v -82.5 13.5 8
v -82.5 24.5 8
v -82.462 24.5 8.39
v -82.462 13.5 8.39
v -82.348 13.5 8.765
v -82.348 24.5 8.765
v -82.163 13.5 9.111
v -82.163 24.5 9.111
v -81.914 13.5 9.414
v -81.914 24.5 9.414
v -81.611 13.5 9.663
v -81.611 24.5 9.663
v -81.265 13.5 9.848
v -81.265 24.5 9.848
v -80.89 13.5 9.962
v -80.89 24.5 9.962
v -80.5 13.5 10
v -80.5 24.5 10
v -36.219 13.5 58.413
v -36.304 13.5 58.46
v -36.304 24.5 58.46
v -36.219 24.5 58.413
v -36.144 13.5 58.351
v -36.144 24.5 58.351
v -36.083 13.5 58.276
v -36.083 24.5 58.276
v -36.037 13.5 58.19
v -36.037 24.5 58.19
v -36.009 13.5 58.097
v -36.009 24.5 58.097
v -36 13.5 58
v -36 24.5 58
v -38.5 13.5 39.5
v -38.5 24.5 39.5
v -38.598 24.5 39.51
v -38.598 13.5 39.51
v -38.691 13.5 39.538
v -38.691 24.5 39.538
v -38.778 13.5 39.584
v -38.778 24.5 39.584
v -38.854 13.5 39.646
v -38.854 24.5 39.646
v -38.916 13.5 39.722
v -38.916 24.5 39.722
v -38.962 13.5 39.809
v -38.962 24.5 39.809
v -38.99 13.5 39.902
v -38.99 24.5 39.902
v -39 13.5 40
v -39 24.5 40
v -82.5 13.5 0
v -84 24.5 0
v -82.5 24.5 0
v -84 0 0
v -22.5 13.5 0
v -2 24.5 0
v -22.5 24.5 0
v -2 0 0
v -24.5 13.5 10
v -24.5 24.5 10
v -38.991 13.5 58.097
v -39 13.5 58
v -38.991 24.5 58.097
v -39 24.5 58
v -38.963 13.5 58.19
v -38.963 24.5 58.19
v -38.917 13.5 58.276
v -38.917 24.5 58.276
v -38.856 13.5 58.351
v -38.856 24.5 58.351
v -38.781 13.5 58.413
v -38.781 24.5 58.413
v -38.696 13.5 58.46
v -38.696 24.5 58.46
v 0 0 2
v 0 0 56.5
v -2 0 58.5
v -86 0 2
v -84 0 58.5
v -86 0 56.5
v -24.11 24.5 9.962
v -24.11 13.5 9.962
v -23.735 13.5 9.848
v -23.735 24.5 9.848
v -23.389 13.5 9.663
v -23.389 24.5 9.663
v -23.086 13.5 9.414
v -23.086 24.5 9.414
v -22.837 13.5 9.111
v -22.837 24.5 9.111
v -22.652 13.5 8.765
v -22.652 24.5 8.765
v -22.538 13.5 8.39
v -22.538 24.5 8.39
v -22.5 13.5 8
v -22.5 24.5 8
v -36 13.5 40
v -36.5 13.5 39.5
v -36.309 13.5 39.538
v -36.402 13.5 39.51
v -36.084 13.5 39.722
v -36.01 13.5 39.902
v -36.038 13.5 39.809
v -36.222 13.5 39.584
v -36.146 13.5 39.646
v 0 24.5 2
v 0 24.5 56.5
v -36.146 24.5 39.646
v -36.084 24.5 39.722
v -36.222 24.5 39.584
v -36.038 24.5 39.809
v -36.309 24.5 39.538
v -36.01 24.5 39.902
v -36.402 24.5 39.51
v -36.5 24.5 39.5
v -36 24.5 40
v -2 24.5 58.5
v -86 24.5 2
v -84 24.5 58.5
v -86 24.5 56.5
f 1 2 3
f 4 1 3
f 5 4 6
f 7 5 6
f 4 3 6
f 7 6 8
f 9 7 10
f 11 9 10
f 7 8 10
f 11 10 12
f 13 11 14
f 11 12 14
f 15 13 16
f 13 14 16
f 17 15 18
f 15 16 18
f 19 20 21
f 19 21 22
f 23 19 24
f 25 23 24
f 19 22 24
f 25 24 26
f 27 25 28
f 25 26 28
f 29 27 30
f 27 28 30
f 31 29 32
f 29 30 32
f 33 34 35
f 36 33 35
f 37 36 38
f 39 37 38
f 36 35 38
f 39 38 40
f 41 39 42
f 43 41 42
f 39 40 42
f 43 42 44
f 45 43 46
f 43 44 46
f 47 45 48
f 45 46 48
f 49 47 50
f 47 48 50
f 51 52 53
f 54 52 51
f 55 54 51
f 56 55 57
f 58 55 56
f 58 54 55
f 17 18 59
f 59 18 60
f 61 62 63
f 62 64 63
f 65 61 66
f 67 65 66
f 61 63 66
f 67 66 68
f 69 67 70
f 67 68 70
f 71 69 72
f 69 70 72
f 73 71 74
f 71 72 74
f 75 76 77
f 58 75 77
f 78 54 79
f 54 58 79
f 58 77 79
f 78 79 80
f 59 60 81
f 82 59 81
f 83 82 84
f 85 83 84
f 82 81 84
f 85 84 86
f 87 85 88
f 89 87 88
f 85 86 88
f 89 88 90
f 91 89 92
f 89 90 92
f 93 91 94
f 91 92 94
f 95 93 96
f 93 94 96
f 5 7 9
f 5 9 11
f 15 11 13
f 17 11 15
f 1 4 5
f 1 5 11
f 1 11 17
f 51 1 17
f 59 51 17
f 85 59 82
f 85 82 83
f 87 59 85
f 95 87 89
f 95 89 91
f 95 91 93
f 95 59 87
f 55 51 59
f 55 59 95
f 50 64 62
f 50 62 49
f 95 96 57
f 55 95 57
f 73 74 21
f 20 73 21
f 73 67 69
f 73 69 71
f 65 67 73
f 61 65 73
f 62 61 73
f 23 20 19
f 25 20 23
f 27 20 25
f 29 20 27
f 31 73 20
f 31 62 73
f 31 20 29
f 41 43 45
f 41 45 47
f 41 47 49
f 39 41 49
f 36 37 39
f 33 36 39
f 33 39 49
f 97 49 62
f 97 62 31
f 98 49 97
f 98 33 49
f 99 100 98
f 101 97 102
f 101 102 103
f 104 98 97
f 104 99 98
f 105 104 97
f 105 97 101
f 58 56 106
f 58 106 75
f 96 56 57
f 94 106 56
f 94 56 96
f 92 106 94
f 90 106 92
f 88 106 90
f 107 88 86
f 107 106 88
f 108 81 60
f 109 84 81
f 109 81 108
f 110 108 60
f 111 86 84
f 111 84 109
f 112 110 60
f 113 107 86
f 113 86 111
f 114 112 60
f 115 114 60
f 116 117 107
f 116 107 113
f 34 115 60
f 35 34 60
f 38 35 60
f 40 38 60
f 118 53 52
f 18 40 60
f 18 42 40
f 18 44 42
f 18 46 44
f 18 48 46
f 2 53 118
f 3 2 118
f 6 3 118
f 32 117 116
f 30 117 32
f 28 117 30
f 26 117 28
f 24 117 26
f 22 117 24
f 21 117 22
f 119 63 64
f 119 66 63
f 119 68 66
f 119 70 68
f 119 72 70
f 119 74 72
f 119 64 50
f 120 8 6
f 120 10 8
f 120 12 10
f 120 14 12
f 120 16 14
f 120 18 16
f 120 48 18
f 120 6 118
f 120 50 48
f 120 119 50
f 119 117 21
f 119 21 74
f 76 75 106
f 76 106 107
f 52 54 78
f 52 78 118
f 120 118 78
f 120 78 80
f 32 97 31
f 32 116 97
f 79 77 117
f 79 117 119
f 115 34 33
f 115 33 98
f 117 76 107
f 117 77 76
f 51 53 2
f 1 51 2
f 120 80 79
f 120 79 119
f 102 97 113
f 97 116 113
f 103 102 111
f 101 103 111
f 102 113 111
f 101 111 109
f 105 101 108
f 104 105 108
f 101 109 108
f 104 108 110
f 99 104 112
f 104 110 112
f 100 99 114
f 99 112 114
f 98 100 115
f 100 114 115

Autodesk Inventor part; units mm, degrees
ref_plane "YZ Plane" through (0, 0, 0) normal (1, 0, 0) x (0, 1, 0)
ref_plane "XZ Plane" through (0, 0, 0) normal (0, 1, 0) x (-1, 0, 0)
ref_plane "XY Plane" through (0, 0, 0) normal (0, 0, 1) x (1, 0, 0)
sketch "Boceto1" plane through (0, 0, 0) normal (0, 1, 0) x (-1, 0, 0)
  line L0 (88, 0) -> (0, 0)
  line L1 (0, 0) -> (0, 58.5)
  line L2 (0, 58.5) -> (88, 58.5)
  line L3 (88, 58.5) -> (88, 0)
  dimension "d0" = 58.5
  dimension "d1" = 88
extrude "Extrusión1" add sketch "Boceto1" along normal blind 24.5
sketch "Boceto2" plane through (0, 24.5, 0) normal (0, 1, 0) x (1, 0, 0)
  line L0 (0, 0) -> (-88, 0) projected
  line L1 (-88, 0) -> (-88, -58.5) projected
  line L2 (-88, -58.5) -> (0, -58.5) projected
  line L3 (0, -58.5) -> (0, 0) projected
  line L4 (-36, -58.5) -> (0, -58.5)
  line L5 (-36.5, -58.5) -> (-38.5, -58.5)
  line L6 (-39, -58) -> (-39, -40)
  line L7 (-38.5, -39.5) -> (-36.5, -39.5)
  line L8 (-36, -40) -> (-36, -58)
  line L9 (0, 0) -> (-22.5, 0)
  line L10 (-22.5, 0) -> (-82.5, 0)
  line L11 (-82.5, 0) -> (-82.5, -8)
  line L12 (-80.5, -10) -> (-24.5, -10)
  line L13 (-22.5, -8) -> (-22.5, 0)
  arc A0 (-24.5, -10) -> (-22.5, -8) centre (-24.5, -8) ccw
  arc A1 (-82.5, -8) -> (-80.5, -10) centre (-80.5, -8) ccw
  arc A2 (-38.5, -39.5) -> (-39, -40) centre (-38.5, -40) ccw
  arc A3 (-36, -40) -> (-36.5, -39.5) centre (-36.5, -40) ccw
  arc A4 (-36.5, -58.5) -> (-36, -58) centre (-36.5, -58) ccw
  arc A5 (-39, -58) -> (-38.5, -58.5) centre (-38.5, -58) ccw
  line L14 (0, 0) -> (-86, 0)
  line L15 (-86, 0) -> (-86, -58.5)
  line L16 (-86, -58.5) -> (0, -58.5)
  line L17 (0, -58.5) -> (0, 0)
  line L18 (-38.6961, -58.4599) -> (-36.3039, -58.4599)
  point P0 (-39, -39.5)
  point P1 (-36, -39.5)
  dimension "d4" = 36
  dimension "d5" = 19
  dimension "d6" = 3
  dimension "d7" = 22.5
  dimension "d8" = 2
  dimension "d9" = 0.5
  dimension "d10" = 56
  dimension "d11" = 88
  dimension "d12" = 58.5
  dimension "d13" = 86
  dimension "d14" = 10
  dimension "d15" = 2.3923
extrude "Extrusión2" cut sketch "Boceto2" against normal blind 11 contours L13 A0 L12 A1 L11 L0 | L15 L2 L1 L0 | L18 A5 L6 A2 L7 A3 L8 A4
sketch "Boceto3" plane through (0, 24.5, 0) normal (0, 1, 0) x (1, 0, 0)
  line L0 (-86, 0) -> (-86, -58.5) projected
  line L1 (-86, -58.5) -> (0, -58.5) projected
  line L2 (0, -58.5) -> (0, 0) projected
  line L3 (0, 0) -> (-22.5, 0) projected
  line L4 (-22.5, 0) -> (-22.5, -8) projected
  arc A0 (-24.5, -10) -> (-22.5, -8) centre (-24.5, -8) ccw projected
  line L5 (-24.5, -10) -> (-80.5, -10) projected
  arc A1 (-82.5, -8) -> (-80.5, -10) centre (-80.5, -8) ccw projected
  line L6 (-82.5, -8) -> (-82.5, 0) projected
  line L7 (-82.5, 0) -> (-86, 0) projected
  line L8 (-39, -58) -> (-39, -40) projected
  arc A2 (-38.5, -39.5) -> (-39, -40) centre (-38.5, -40) ccw projected
  line L9 (-38.5, -39.5) -> (-36.5, -39.5) projected
  arc A3 (-36, -40) -> (-36.5, -39.5) centre (-36.5, -40) ccw projected
  line L10 (-36, -40) -> (-36, -58) projected
  arc A4 (-36.3039, -58.4599) -> (-36, -58) centre (-36.5, -58) ccw projected
  line L11 (-36.3039, -58.4599) -> (-38.6961, -58.4599) projected
  arc A5 (-39, -58) -> (-38.6961, -58.4599) centre (-38.5, -58) ccw projected
sketch "Boceto4" plane through (0, 13.5, 0) normal (0, 1, 0) x (1, 0, 0)
  line L0 (-88, -58.5) -> (-88, 0) projected
  line L1 (-86, -58.5) -> (-88, -58.5) projected
  line L2 (-88, 0) -> (-86, 0)
  line L3 (-86, 0) -> (-86, -58.5)
  line L4 (-86, -58.5) -> (-88, -58.5)
  line L5 (-88, -58.5) -> (-88, 0)
  point P0 (0, 0)
extrude "Extrusión3" cut sketch "Boceto4" against normal blind 50
chamfer "Chaflán1" distance 2 angle 45 1 edges at (0, 12.25, 58.5)
chamfer "Chaflán2" distance 2 angle 45 1 edges at (0, 12.25, 0)
chamfer "Chaflán3" distance 2 angle 45 1 edges at (-86, 12.25, 58.5)
chamfer "Chaflán4" distance 2 angle 45 1 edges at (-86, 12.25, 0)
properties part number "Rasp" material "Policarbonato, ahumado"
